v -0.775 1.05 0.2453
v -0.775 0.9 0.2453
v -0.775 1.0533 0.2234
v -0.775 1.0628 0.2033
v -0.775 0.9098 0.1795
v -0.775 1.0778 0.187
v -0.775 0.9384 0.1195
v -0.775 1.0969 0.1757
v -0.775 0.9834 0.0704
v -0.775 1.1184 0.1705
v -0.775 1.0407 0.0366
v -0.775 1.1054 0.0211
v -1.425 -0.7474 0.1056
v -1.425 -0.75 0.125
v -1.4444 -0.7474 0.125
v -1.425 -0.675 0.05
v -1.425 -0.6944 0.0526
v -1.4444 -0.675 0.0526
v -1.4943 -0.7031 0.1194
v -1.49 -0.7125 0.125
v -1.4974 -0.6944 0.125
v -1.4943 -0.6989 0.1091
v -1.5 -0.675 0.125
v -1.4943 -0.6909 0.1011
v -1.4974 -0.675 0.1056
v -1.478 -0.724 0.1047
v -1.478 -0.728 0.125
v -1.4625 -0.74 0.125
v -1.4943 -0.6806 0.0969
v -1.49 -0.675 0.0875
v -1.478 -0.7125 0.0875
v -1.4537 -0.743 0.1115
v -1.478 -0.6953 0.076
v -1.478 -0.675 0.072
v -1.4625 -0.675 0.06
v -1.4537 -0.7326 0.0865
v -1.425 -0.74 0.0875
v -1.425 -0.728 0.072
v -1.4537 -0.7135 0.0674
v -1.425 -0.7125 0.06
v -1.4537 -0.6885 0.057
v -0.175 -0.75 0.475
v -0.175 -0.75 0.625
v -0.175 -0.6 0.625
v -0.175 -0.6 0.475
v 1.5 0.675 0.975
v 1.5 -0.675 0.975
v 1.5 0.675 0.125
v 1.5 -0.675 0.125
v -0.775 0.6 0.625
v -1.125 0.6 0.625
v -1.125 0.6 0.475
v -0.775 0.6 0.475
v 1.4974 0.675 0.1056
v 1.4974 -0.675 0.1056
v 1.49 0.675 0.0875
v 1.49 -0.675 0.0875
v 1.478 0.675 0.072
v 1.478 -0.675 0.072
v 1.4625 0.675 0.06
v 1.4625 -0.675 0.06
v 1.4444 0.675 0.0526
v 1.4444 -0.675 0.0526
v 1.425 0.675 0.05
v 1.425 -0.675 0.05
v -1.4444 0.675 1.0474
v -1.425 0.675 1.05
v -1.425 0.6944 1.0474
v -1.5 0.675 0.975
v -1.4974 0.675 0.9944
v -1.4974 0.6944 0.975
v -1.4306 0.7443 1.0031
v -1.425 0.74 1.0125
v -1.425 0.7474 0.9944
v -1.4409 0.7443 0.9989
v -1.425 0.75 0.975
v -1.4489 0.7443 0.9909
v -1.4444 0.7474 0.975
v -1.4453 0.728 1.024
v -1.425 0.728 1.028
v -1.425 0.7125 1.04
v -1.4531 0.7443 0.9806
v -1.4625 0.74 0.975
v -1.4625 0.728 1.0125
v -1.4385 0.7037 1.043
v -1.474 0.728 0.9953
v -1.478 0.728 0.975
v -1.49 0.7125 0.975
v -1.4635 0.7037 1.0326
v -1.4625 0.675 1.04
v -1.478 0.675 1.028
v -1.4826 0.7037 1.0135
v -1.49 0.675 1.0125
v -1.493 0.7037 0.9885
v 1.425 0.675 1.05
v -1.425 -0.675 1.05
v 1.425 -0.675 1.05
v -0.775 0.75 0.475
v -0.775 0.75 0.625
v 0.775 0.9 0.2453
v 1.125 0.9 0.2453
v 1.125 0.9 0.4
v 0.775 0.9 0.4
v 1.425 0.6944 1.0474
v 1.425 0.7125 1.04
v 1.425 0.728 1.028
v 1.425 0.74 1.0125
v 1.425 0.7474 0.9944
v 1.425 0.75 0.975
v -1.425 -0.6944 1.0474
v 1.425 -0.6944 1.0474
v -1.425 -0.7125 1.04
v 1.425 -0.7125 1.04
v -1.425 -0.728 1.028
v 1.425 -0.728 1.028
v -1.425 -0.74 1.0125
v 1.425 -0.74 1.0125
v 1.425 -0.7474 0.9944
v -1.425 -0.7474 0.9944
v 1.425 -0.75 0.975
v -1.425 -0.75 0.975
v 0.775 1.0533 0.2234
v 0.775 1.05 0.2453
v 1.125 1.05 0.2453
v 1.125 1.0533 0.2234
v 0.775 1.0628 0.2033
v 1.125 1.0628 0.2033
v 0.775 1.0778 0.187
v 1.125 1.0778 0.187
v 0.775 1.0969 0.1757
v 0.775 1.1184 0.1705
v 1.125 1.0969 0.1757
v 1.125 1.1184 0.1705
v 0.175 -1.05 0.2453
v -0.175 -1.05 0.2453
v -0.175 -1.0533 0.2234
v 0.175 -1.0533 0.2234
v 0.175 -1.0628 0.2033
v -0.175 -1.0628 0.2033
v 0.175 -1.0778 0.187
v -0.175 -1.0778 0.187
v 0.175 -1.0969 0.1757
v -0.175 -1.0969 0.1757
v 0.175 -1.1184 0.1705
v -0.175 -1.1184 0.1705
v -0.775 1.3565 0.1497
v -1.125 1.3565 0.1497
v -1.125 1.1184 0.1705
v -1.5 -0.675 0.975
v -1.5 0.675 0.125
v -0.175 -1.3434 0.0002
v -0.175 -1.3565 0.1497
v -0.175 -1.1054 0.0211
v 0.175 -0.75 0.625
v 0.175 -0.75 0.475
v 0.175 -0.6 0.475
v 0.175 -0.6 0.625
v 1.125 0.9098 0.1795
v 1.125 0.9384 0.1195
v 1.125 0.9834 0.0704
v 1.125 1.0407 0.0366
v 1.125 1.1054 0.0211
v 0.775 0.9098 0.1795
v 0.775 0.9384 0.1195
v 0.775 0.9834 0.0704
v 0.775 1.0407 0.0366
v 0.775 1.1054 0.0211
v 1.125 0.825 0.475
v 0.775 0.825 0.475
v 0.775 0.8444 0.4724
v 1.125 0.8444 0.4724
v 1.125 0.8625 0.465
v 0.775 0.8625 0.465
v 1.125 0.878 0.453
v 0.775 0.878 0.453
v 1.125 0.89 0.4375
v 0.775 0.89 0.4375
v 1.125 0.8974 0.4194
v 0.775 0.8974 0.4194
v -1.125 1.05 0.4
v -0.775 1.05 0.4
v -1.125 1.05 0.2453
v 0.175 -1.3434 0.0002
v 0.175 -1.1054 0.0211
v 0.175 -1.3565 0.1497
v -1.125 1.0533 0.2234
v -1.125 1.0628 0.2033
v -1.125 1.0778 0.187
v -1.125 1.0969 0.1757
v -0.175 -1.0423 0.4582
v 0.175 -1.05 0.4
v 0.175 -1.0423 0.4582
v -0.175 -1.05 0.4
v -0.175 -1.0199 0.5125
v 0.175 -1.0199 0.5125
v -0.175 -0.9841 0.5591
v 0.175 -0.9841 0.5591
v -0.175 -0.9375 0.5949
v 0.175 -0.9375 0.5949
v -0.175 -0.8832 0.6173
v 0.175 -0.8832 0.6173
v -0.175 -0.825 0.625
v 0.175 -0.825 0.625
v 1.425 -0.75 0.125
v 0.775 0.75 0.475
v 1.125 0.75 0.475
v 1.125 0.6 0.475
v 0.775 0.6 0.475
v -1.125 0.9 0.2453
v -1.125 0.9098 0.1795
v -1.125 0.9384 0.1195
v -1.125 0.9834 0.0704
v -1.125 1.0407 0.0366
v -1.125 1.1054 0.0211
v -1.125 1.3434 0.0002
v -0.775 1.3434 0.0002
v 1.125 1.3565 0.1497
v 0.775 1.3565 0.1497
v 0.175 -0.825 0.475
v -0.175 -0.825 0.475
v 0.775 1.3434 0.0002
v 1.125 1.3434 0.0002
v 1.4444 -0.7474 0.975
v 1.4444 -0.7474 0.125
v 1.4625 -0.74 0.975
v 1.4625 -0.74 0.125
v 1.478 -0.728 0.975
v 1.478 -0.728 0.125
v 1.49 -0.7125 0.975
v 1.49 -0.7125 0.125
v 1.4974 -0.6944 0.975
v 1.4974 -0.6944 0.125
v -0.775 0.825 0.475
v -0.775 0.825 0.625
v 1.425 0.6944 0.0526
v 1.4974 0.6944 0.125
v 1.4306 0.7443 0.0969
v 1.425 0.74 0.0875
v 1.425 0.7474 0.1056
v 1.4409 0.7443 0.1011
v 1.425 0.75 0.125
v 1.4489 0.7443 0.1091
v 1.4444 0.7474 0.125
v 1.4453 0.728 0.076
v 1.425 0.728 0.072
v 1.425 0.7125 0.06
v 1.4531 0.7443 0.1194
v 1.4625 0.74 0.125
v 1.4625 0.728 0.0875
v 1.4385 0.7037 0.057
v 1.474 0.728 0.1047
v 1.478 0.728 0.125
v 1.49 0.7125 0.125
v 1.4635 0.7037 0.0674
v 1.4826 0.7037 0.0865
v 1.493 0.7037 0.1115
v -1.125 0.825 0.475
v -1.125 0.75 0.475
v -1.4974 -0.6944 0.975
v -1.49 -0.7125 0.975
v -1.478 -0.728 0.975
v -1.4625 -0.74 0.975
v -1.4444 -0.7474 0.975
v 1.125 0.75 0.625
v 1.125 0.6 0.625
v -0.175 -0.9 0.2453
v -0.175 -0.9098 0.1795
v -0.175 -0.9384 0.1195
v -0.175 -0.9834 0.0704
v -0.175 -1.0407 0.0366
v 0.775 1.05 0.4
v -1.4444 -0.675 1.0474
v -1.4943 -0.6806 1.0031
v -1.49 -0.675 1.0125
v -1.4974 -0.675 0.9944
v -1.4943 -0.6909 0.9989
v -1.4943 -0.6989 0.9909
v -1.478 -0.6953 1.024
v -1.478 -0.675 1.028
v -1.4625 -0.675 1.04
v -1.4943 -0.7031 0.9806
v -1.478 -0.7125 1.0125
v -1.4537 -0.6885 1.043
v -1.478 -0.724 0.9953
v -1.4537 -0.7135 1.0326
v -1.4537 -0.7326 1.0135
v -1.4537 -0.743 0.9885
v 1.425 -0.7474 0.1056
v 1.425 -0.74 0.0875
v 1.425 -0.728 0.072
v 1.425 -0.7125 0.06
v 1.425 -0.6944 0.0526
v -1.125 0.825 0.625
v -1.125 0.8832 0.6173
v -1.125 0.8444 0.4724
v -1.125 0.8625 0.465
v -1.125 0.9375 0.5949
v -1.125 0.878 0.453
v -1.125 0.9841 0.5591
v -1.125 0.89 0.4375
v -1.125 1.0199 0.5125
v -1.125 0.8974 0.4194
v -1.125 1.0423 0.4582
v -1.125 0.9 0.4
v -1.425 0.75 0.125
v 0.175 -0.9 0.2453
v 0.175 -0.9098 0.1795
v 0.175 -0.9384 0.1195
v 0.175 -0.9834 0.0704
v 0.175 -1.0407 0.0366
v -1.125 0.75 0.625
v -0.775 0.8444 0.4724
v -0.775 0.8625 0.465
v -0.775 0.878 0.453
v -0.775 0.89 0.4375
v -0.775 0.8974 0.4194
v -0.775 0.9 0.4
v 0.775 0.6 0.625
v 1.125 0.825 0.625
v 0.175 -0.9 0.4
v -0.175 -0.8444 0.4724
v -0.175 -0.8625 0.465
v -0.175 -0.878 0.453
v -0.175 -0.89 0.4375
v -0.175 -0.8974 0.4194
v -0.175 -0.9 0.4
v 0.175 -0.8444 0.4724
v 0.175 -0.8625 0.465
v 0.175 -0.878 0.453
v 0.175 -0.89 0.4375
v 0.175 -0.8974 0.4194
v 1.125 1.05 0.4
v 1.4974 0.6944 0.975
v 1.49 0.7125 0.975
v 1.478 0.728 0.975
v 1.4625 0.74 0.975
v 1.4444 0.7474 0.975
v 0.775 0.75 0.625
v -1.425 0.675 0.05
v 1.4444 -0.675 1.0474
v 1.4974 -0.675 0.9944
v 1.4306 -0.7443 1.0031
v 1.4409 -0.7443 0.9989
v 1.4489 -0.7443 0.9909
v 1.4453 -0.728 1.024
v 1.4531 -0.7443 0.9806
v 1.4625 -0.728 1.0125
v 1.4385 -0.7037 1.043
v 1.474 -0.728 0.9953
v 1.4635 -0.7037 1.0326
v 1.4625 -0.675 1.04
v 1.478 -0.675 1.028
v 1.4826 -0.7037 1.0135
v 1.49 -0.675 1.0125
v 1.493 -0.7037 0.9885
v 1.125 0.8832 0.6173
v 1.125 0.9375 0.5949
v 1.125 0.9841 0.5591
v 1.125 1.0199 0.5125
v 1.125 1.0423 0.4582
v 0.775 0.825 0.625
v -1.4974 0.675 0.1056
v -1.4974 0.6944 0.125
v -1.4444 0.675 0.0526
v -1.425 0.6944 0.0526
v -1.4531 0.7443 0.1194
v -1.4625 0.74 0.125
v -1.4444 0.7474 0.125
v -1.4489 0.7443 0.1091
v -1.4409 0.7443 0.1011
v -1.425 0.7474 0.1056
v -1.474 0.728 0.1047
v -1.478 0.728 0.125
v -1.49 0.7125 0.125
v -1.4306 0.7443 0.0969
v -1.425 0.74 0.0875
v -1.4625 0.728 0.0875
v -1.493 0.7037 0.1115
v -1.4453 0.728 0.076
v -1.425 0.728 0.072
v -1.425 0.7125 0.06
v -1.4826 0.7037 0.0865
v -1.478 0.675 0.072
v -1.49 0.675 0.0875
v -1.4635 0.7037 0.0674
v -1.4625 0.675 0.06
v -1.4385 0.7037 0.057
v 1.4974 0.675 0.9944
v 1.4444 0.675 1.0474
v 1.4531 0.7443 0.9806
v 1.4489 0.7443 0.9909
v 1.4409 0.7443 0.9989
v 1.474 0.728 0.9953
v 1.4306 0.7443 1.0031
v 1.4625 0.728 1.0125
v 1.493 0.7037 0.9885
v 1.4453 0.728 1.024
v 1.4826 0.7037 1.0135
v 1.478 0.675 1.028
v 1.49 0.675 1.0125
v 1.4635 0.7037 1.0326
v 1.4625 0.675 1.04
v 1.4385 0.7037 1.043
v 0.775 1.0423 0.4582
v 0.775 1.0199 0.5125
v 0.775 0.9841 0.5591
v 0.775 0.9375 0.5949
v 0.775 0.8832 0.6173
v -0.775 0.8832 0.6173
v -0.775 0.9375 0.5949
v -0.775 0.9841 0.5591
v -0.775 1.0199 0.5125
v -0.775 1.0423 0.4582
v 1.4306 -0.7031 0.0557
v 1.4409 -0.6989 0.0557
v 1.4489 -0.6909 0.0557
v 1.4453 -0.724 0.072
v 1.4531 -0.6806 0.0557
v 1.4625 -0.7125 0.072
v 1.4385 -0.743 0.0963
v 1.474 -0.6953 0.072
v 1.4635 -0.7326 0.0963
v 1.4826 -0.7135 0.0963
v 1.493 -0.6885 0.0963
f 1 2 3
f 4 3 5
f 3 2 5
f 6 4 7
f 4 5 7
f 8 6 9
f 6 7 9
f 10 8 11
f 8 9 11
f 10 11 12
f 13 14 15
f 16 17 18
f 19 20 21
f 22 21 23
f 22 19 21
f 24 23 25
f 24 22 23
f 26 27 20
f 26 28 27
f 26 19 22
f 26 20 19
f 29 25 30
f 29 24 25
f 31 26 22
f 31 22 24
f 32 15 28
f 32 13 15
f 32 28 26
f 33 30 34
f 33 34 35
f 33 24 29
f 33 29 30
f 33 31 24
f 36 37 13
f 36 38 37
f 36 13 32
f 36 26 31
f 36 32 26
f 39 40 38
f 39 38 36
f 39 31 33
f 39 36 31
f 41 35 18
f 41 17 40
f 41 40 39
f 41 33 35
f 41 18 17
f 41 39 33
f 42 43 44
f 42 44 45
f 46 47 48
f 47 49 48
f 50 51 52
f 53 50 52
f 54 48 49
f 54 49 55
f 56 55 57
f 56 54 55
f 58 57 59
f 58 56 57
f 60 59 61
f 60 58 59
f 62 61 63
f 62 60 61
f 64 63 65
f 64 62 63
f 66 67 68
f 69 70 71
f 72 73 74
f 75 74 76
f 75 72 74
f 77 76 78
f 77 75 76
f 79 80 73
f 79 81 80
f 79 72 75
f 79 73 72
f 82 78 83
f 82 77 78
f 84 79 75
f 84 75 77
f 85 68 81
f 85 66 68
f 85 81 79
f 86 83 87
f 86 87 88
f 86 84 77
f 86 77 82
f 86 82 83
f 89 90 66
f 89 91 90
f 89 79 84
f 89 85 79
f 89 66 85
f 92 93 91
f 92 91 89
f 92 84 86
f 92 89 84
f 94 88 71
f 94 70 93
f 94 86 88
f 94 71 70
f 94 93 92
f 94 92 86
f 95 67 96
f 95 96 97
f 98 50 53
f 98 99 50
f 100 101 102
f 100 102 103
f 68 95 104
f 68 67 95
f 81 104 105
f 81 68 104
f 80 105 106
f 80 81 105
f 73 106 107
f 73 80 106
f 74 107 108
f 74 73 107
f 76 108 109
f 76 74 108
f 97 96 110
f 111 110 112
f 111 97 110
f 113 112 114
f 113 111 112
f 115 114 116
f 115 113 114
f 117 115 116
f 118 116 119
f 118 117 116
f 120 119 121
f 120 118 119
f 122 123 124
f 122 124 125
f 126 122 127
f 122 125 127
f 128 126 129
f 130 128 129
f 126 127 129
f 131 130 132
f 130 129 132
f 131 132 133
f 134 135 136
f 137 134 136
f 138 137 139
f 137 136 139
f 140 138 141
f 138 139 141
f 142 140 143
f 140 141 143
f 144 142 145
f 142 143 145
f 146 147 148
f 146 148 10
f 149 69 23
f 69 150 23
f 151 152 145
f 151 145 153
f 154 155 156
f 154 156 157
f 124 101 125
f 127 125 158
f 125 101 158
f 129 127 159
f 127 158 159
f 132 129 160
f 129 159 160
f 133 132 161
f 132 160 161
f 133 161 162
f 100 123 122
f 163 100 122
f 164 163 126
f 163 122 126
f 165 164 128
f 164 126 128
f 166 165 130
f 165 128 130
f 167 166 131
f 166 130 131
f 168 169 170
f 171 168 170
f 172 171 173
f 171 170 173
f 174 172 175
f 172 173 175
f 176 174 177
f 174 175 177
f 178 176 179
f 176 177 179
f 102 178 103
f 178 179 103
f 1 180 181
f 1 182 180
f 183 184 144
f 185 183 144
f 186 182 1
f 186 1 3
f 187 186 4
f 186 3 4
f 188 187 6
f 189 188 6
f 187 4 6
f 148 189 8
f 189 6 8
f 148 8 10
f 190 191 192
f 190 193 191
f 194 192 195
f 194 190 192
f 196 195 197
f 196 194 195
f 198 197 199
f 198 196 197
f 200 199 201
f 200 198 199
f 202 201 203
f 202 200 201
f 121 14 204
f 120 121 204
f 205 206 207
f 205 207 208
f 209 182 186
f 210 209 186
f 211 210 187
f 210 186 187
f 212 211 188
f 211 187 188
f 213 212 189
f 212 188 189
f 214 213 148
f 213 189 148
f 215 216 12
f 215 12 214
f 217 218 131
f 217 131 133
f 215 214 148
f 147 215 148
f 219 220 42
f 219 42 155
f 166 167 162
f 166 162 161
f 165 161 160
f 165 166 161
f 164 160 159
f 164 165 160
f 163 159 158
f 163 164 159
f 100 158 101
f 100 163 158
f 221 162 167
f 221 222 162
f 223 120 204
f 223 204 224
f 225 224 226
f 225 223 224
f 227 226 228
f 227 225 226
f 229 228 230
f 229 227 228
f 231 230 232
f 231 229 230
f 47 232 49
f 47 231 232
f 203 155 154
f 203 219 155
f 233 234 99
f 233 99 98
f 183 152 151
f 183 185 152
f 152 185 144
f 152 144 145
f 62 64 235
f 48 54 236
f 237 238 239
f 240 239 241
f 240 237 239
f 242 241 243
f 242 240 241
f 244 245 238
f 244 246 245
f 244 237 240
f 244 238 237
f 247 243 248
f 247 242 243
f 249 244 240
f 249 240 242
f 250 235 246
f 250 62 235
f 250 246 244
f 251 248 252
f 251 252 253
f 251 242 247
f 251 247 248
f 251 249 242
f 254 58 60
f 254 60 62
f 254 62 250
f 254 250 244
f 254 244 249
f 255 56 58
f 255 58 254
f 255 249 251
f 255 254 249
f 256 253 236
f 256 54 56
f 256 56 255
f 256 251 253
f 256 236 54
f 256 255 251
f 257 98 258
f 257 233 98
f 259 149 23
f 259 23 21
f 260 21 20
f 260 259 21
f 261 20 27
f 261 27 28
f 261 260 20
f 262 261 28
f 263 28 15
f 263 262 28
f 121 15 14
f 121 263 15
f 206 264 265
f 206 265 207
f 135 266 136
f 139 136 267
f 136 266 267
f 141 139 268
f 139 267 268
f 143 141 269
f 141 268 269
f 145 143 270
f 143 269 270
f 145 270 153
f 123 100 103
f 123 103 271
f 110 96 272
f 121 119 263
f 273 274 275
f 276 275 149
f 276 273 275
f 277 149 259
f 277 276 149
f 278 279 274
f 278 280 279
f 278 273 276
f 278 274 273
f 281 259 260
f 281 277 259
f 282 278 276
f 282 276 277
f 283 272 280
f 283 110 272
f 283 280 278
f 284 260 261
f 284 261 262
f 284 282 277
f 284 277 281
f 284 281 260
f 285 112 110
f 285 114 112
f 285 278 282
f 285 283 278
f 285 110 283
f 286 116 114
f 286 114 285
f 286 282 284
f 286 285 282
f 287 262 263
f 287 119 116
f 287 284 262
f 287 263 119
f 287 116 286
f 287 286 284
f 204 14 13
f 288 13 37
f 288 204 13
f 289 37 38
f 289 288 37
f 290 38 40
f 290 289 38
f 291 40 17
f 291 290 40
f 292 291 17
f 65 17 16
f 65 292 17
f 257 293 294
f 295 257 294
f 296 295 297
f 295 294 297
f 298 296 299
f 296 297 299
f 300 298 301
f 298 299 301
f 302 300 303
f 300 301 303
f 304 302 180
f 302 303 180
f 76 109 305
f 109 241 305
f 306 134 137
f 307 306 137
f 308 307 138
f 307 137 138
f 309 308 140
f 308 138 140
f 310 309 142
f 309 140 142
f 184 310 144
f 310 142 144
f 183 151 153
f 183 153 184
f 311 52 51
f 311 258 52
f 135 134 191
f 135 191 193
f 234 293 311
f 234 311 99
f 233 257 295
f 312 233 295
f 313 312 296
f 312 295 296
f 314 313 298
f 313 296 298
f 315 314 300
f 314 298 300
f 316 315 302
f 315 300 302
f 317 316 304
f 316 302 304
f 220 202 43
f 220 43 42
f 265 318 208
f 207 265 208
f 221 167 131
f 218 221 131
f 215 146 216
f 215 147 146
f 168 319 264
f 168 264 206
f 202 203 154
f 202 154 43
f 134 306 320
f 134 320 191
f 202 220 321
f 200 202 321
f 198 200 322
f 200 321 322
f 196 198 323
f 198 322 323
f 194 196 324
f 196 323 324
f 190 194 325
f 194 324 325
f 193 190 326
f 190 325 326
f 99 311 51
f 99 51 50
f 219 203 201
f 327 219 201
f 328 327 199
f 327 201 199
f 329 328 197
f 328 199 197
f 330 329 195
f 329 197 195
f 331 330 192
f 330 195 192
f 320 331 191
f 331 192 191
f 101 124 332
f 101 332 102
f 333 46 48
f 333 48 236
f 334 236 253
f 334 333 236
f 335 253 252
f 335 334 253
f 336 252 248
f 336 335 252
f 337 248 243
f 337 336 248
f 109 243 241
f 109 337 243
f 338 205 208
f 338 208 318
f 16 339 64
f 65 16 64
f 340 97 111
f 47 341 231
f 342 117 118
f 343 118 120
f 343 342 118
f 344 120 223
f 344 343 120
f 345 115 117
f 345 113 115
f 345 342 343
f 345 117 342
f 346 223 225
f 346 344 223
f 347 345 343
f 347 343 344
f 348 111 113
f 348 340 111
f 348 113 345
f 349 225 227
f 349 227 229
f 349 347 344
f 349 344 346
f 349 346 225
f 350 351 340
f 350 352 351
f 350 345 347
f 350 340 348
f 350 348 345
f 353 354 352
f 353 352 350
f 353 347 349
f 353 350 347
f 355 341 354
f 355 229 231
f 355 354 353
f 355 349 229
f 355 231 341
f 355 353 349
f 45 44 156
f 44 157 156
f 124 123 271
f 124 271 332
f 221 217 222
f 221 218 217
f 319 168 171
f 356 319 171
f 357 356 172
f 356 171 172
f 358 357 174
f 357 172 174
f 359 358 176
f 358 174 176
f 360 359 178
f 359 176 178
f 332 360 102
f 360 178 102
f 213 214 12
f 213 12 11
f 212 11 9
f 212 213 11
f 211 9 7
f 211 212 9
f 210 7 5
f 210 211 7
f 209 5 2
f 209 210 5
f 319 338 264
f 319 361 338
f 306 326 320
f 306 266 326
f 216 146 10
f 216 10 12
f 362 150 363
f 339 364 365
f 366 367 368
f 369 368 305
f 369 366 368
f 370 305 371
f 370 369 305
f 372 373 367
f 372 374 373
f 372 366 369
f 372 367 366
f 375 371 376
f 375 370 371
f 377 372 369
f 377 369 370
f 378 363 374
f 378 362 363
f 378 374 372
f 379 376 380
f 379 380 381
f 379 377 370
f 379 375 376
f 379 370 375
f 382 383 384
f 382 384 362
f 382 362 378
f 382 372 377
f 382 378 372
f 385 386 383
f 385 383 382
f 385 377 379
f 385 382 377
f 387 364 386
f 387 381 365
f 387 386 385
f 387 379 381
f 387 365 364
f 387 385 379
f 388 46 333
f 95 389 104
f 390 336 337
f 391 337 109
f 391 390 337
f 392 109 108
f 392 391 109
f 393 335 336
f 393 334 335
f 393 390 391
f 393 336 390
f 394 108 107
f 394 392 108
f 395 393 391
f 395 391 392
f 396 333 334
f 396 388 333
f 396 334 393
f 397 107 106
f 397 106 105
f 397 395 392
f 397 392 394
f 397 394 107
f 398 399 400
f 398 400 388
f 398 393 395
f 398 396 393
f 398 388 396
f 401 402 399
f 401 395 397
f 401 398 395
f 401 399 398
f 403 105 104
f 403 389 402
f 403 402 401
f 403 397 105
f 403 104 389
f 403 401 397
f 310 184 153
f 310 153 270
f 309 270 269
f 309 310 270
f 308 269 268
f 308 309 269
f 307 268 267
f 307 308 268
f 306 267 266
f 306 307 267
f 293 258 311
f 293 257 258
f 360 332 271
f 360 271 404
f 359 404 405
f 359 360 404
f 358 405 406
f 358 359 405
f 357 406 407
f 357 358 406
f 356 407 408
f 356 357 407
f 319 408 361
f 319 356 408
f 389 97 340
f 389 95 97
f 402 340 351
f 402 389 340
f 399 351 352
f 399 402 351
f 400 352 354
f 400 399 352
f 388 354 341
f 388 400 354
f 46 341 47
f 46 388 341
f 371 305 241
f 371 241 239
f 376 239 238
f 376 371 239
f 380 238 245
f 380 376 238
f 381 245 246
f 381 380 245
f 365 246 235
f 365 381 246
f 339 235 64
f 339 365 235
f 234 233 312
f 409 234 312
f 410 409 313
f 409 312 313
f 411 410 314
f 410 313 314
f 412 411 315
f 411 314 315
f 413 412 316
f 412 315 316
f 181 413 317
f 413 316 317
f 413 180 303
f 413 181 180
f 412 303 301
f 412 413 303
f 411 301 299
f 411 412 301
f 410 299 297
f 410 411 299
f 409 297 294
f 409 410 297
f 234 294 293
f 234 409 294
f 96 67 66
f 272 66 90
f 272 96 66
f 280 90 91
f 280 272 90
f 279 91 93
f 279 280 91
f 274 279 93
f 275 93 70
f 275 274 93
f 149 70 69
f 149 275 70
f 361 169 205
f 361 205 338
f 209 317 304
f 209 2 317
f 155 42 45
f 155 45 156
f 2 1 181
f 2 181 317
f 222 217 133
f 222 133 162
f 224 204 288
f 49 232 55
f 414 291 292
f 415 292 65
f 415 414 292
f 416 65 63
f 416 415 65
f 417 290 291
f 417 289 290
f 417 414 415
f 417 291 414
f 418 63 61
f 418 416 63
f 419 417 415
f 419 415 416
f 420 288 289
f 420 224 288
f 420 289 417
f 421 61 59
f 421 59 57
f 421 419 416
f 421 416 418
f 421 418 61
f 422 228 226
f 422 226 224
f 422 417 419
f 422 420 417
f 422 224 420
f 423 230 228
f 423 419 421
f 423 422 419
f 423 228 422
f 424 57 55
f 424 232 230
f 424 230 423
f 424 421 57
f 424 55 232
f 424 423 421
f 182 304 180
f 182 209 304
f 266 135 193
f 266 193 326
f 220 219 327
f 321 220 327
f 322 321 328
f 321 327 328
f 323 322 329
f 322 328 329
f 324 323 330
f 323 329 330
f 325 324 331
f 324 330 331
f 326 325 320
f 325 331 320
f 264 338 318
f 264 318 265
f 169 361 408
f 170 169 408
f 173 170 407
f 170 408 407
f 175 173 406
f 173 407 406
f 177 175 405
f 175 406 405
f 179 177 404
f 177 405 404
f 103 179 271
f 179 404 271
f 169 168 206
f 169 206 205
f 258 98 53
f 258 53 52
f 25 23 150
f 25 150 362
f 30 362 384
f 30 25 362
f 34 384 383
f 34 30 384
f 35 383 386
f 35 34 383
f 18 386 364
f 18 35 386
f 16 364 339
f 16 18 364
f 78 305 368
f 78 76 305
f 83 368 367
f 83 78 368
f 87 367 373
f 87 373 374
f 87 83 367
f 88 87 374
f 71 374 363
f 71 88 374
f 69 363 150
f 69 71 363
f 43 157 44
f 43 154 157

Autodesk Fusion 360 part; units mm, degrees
ref_plane "WorkPlane1" through (0, 0, 0.05) normal (0, 0, 1) x (1, 0, 0)
sketch "Sketch1" plane through (0, 0, 0.05) normal (0, 0, 1) x (1, 0, 0)
  line L0 (1.5, 0.75) -> (-1.5, 0.75)
  line L1 (-1.5, 0.75) -> (-1.5, -0.75)
  line L2 (-1.5, -0.75) -> (1.5, -0.75)
  line L3 (1.5, -0.75) -> (1.5, 0.75)
  line L4 (1.5, 0.75) -> (-1.5, -0.75) construction
  line L5 (-1.5, 0.75) -> (1.5, -0.75) construction
  dimension "d2" = 3
  dimension "d3" = 1.5
extrude "Extrude1" add sketch "Sketch1" along normal blind 1 makes body 1
sketch "Sketch2" plane through (0, -0.75, 0) normal (0, -1, 0) x (1, 0, 0)
  line L0 (-1.5, 0.05) -> (1.5, 0.05)
  line L1 (1.5, 0.05) -> (1.5, 1.05)
  line L2 (1.5, 1.05) -> (-1.5, 1.05)
  line L3 (-1.5, 1.05) -> (-1.5, 0.05)
  line L4 (0.175, 0.475) -> (-0.175, 0.475)
  line L5 (-0.175, 0.475) -> (-0.175, 0.625)
  line L6 (-0.175, 0.625) -> (0.175, 0.625)
  line L7 (0.175, 0.625) -> (0.175, 0.475)
  line L8 (0.175, 0.475) -> (-0.175, 0.625) construction
  line L9 (-0.175, 0.475) -> (0.175, 0.625) construction
  point P0 (0, 0.55)
  dimension "d6" = 0.35
  dimension "d7" = 0.15
  dimension "d8" = 0.5
sketch "Sketch3" plane through (0, 0, 0) normal (1, 0, 0) x (0, 1, 0)
  line L0 (-0.75, 0.55) -> (-0.825, 0.55)
  arc A0 (-0.825, 0.55) -> (-0.975, 0.4) centre (-0.825, 0.4) ccw
  line L1 (-0.975, 0.4) -> (-0.975, 0.2453)
  arc A1 (-1.1119, 0.0958) -> (-0.975, 0.2453) centre (-1.125, 0.2453) ccw
  line L2 (-1.1119, 0.0958) -> (-1.35, 0.075)
  line L3 (-0.75, 0.625) -> (-0.75, 0.475)
  line L4 (-0.75, 0.55) -> (-0.6, 0.55)
  line L5 (-1.35, 0.075) -> (-0.85, 0.075) construction
  point P0 (-0.75, 0.55)
  dimension "d10" = 0.15
  dimension "d11" = 0.075
  dimension "d21" = 0.15
  dimension "d22" = 0.225
  dimension "d23" = 0.6
  dimension "d24" = 0.5
  dimension "d25" = 5
  dimension "d26" = 0.15
sweep "Sweep1" add profiles "Sketch2" path "Sketch3" along L2 A1 L1 A0 L0 L4 section 1 contours L4 L5 L6 L7 separate body makes body 2
pattern_linear "R-Pattern1" count 3 spacing 0.95 along (1, 0, 0) both ways of "Sweep1" makes body 3 makes body 4
fillet "Fillet1" radius 0.075 12 edges at (1.5, 0, 1.05) (0, -0.75, 1.05) (-1.5, 0, 1.05) (0, 0.75, 1.05) (1.5, -0.75, 0.55) (1.5, 0, 0.05) (1.5, 0.75, 0.55) (0, -0.75, 0.05) (-1.5, -0.75, 0.55) (-1.5, 0, 0.05) (0, 0.75, 0.05) (-1.5, 0.75, 0.55) on bodies 1
move_body "Move1" bodies 3 4 to x (-1, 0, 0) y (0, -1, 0) z (0, 0, 1) at (0, 0, 0)
equation "d1 = sop3_above_board"
equation "d2 = sop3_package_width"
equation "d3 = sop3_package_depth"
equation "d4 = sop3_package_height"
equation "d6 = sop3_lead_width"
equation "d7 = sop3_lead_thickness"
equation "d8 = sop3_lead_attach"
equation "d10 = sop3_lead_thickness"
equation "d11 = sop3_lead_thickness / 2"
equation "sop3_lead_thickness = 0.15 mm"
equation "sop3_lead_attach = 0.5 mm"
equation "sop3_lead_width = 0.35 mm"
equation "sop3_lead_spacing = 0.95 mm"
equation "sop3_package_width = 3 mm"
equation "sop3_package_height = 1 mm"
equation "sop3_package_depth = 1.5 mm"
equation "sop3_above_board = 0.05 mm"
equation "d21 = sop3_lead_into_package"
equation "d22 = sop3_lead_thickness * ( 3 / 2 )"
equation "d23 = sop3_lead_extension"
equation "d25 = sop3_lead_foot_angle"
equation "d26 = d10"
equation "sop3_lead_extension = 0.6 mm"
equation "sop3_lead_foot_angle = 5 deg"
equation "sop3_lead_into_package = 0.15 mm"
equation "d34 = sop3_lead_spacing"
equation "sop3_optional_lead_extension = 0 mm"
